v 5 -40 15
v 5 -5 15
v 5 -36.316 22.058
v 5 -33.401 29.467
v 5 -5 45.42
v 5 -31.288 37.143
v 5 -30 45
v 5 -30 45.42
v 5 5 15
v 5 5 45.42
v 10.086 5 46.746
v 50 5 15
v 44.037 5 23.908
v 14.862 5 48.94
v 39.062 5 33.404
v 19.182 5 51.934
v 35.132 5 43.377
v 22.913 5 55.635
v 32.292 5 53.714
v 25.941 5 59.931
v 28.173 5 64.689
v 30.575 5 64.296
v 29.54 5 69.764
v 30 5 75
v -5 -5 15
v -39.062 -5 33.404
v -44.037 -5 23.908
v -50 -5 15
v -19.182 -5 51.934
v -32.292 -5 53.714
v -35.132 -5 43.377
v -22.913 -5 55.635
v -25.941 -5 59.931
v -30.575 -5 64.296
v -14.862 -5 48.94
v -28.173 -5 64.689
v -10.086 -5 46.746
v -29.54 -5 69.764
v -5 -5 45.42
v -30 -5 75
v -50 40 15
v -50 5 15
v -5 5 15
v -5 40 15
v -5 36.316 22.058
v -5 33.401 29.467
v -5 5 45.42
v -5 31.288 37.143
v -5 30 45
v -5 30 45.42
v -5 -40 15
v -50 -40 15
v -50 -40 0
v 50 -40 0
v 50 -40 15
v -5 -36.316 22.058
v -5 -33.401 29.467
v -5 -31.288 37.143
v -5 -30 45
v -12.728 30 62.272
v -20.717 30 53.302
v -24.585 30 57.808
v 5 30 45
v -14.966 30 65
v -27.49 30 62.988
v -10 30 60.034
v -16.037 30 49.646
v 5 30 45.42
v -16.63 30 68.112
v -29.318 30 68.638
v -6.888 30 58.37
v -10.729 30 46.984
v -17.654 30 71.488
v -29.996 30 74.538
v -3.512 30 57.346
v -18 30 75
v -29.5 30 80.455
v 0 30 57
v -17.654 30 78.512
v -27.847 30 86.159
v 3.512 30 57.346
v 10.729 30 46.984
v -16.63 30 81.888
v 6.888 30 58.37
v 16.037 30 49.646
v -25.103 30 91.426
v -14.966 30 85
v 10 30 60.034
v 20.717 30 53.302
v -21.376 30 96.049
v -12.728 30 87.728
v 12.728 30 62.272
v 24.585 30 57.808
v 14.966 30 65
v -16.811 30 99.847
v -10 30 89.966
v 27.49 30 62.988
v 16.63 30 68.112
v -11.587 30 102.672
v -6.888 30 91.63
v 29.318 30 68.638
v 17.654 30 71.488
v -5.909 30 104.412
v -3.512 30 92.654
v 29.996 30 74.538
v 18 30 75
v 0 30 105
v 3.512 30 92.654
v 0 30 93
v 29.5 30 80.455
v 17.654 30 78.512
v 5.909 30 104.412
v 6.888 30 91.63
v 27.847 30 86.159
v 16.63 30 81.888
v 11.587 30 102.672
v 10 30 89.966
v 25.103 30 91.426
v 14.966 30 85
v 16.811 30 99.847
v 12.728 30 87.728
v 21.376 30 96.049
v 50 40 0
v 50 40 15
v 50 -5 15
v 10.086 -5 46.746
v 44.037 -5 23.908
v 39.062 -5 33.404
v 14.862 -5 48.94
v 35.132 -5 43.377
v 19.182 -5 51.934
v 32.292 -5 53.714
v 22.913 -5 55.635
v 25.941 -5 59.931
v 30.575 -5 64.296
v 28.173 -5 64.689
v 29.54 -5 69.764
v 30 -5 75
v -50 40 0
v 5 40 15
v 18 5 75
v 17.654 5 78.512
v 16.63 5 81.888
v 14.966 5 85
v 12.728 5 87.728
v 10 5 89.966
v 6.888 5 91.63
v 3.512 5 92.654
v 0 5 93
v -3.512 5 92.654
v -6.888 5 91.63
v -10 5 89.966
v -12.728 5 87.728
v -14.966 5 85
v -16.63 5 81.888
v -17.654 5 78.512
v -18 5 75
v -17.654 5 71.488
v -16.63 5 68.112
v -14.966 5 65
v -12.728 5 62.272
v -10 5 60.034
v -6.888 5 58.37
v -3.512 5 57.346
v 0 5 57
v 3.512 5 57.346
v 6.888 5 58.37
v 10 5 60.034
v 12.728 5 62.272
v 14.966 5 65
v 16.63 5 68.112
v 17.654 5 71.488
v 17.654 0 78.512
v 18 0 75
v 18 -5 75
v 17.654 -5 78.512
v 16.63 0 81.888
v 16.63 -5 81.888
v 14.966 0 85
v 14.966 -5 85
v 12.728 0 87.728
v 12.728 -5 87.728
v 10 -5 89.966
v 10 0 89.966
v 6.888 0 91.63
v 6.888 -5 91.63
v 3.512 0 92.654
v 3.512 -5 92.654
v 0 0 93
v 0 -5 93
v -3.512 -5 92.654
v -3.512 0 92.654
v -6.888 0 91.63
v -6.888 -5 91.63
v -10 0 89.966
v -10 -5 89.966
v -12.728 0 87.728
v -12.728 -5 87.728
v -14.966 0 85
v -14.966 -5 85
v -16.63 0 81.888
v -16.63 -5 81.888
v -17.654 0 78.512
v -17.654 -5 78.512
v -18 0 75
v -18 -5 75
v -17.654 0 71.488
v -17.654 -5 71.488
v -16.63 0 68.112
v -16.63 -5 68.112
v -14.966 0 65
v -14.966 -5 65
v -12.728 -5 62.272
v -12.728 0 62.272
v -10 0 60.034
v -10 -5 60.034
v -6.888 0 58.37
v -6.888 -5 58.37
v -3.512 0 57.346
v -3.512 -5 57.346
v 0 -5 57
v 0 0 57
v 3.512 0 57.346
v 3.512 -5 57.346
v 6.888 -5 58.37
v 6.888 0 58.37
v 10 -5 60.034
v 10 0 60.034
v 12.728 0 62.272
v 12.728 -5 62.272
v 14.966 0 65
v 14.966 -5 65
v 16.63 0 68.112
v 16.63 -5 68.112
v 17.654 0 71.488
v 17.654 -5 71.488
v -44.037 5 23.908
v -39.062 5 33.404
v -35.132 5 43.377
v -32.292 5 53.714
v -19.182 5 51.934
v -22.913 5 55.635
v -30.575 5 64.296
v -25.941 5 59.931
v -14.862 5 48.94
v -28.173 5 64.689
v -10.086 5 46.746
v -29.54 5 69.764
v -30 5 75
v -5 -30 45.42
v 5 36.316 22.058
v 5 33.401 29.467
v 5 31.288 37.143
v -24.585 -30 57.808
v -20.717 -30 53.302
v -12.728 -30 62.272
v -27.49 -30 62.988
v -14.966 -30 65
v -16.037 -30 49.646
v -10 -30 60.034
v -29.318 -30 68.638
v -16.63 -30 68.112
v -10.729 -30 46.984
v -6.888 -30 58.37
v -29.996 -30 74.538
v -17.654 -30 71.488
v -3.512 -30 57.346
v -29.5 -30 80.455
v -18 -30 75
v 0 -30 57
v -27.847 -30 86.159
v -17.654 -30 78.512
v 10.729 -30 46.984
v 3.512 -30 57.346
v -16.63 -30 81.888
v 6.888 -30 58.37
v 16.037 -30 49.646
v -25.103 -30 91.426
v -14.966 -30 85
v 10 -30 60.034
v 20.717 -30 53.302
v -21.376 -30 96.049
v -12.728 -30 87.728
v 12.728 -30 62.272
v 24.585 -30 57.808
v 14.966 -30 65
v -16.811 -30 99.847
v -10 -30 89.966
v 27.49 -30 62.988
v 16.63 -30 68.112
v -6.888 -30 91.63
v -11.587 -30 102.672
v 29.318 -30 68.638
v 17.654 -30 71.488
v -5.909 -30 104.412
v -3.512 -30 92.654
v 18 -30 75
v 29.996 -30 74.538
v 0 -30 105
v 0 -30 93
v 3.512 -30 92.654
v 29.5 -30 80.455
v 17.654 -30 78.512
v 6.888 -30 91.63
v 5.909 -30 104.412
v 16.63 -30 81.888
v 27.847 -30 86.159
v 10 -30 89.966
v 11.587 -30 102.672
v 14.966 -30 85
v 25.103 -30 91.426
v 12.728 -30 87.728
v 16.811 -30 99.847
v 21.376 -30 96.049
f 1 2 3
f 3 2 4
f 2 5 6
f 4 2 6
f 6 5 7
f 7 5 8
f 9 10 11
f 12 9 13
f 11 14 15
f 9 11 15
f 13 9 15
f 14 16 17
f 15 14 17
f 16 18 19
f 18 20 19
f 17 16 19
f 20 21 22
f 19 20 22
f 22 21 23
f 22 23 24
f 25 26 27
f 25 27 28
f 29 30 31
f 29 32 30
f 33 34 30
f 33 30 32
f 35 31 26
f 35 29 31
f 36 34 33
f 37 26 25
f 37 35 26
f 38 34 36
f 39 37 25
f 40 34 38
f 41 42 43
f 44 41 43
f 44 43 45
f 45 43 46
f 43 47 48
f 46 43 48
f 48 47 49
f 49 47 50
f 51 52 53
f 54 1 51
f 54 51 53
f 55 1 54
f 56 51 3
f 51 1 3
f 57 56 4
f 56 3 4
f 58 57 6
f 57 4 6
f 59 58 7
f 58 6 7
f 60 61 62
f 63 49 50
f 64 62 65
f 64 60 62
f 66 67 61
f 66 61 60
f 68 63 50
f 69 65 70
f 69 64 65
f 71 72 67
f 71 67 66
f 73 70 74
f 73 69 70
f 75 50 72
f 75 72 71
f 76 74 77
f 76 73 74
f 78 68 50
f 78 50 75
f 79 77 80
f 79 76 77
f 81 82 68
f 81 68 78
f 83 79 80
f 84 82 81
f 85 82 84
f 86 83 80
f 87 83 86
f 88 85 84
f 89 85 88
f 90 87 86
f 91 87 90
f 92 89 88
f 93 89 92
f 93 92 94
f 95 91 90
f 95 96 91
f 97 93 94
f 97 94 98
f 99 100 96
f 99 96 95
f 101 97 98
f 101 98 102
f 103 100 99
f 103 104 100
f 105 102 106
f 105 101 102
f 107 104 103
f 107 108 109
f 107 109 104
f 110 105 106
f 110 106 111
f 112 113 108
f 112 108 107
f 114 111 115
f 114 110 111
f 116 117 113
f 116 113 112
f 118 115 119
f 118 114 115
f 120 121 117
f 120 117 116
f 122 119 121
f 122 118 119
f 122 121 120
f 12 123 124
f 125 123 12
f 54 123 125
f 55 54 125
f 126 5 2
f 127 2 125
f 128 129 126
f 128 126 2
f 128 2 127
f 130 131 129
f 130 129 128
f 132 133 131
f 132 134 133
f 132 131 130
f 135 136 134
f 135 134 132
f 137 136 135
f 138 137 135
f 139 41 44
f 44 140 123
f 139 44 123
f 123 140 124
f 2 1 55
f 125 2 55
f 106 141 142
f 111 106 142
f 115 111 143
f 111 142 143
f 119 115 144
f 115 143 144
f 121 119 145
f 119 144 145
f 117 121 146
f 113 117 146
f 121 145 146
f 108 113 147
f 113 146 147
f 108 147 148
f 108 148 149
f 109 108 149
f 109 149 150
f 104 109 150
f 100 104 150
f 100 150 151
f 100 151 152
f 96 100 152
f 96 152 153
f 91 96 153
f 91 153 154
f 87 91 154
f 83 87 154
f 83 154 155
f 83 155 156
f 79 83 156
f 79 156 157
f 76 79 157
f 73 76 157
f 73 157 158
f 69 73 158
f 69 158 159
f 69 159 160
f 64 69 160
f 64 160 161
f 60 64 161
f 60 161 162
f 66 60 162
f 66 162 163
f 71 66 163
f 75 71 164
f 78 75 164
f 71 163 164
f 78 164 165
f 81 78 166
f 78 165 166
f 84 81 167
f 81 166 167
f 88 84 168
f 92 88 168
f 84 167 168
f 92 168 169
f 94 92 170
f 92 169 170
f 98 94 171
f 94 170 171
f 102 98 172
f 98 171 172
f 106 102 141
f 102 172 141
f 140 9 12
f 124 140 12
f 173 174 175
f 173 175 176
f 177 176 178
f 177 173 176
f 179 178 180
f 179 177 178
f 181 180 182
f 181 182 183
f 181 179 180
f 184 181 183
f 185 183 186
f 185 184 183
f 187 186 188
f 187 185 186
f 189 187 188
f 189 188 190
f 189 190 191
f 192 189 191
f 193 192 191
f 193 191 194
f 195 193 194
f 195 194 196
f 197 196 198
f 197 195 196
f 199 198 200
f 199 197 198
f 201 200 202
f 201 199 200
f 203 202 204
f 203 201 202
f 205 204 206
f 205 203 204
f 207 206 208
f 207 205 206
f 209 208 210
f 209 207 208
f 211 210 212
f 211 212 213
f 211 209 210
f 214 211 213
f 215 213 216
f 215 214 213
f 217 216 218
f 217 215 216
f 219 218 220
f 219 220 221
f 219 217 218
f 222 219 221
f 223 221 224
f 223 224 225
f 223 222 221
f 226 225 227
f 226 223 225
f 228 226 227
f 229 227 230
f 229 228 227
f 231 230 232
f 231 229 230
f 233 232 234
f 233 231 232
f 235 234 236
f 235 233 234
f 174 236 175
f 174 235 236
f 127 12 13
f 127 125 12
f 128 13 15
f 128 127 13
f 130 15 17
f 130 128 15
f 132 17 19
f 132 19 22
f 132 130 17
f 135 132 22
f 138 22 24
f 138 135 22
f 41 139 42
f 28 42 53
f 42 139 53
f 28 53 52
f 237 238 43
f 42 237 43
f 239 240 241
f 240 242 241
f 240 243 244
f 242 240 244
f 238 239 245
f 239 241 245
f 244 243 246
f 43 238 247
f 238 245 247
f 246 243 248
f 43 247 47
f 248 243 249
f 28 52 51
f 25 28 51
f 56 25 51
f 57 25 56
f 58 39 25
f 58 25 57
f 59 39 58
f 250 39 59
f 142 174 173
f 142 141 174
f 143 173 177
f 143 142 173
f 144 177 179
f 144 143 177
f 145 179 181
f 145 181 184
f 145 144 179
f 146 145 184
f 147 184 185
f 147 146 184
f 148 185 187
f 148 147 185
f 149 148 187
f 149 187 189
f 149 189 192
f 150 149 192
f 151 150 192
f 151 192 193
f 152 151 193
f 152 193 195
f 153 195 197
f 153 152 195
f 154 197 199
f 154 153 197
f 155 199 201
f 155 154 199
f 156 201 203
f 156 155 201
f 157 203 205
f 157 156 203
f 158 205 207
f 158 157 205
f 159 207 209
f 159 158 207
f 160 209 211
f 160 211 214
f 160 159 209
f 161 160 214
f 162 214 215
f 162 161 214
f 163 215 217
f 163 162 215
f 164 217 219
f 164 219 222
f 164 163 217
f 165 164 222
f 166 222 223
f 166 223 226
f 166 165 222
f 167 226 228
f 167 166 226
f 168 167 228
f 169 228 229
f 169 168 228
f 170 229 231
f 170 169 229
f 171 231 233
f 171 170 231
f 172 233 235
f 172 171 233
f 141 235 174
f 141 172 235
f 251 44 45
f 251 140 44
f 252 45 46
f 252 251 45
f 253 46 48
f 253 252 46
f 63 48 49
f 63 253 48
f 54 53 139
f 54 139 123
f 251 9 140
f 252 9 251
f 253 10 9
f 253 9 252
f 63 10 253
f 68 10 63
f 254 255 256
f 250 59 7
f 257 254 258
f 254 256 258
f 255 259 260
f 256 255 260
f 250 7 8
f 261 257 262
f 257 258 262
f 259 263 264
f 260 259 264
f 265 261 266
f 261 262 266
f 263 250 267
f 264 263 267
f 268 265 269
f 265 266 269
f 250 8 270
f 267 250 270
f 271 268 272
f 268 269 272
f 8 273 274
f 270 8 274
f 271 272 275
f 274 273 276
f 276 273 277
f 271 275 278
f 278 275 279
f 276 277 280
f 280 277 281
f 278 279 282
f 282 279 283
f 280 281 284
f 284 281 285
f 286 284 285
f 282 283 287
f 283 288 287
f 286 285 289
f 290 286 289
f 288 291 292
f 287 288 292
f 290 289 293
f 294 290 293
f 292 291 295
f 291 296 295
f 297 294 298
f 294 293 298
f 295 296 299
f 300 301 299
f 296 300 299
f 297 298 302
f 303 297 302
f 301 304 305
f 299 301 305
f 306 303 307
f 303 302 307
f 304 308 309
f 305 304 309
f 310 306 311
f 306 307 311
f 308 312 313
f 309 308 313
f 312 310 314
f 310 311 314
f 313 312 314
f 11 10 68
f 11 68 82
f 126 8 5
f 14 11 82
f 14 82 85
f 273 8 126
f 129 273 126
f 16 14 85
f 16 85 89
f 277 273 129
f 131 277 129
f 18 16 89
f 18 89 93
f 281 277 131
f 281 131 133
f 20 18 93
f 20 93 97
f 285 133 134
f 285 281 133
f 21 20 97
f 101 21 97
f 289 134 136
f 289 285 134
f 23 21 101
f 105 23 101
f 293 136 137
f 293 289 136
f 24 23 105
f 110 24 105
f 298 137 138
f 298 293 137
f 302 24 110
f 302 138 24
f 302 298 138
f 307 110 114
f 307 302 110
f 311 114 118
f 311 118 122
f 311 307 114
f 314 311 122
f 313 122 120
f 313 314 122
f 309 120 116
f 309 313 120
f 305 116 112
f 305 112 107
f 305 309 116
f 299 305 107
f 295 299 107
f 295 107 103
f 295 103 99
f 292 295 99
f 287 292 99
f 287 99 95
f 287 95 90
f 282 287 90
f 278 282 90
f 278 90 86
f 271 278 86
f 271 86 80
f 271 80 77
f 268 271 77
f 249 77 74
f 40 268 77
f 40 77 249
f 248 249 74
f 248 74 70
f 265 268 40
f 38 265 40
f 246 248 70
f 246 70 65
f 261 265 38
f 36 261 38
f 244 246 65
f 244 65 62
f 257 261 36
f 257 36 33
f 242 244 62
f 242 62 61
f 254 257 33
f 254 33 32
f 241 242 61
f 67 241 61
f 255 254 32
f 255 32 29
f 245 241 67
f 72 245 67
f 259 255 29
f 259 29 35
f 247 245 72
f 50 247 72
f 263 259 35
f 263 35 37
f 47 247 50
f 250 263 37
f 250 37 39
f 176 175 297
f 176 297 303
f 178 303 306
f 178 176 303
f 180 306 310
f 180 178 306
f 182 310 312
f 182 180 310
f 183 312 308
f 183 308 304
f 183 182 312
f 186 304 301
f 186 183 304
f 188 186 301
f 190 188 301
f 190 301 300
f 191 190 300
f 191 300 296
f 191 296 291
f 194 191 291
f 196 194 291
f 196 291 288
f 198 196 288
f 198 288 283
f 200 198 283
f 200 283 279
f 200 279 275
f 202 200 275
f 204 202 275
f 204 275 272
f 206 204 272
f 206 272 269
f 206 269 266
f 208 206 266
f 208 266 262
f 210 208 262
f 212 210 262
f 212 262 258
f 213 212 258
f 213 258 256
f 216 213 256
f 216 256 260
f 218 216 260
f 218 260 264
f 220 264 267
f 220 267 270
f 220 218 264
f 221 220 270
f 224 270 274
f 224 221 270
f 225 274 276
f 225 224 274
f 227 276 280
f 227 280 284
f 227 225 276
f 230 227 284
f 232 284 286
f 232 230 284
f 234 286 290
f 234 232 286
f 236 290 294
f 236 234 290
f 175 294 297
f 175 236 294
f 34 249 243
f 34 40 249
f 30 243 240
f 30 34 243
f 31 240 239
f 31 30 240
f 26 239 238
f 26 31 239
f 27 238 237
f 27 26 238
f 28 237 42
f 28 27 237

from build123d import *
from build123d import SkipClean  # not in build123d's __all__

# Parameters (mm, degrees)
F0_W     = 100
F0_H     = 15
F1_DEPTH = 40
F0_R     = 18
F2_DEPTH = 5
F3_DEPTH = 30
F5_DEPTH = 5


# Not quite as in the source:
# - a pattern or mirror of a feature is missing from the dataset's text; its kind, count and spacing are read off the source's solid


with BuildPart() as f1:
    # F0 (on Front) → F1 (new body, symmetric)
    with BuildSketch(Plane.XZ):
        with Locations((0, 7.5)):
            Rectangle(F0_W, F0_H)
    extrude(amount=F1_DEPTH, both=True)

    # F0 (on Front) → F2 (join, symmetric)
    with BuildSketch(Plane.XZ):
        with BuildLine():
            ThreePointArc((-30, 75), (-35.1316701949, 43.3772233983), (-50, 15))
            Line((-50, 15), (50, 15))
            ThreePointArc((50, 15), (35.1316701949, 43.3772233983), (30, 75))
            ThreePointArc((30, 75), (0, 45), (-30, 75))
        make_face()
        with Locations((0, 7.5)):
            Rectangle(F0_W, F0_H)
        with BuildLine():
            ThreePointArc((30, 75), (0, 105), (-30, 75))
            ThreePointArc((-30, 75), (0, 45), (30, 75))
        make_face()
        with Locations((0, 75)):
            Circle(F0_R, mode=Mode.SUBTRACT)
    extrude(amount=F2_DEPTH, both=True)

    # F0 (on Front) → F3 (join, symmetric)
    with BuildSketch(Plane.XZ):
        with BuildLine():
            ThreePointArc((30, 75), (0, 105), (-30, 75))
            ThreePointArc((-30, 75), (0, 45), (30, 75))
        make_face()
        with Locations((0, 75)):
            Circle(F0_R, mode=Mode.SUBTRACT)
    with SkipClean():  # cleaning this boolean's faces spoils the solid; the shape is the same uncleaned
        extrude(amount=F3_DEPTH, both=True)

    # F4 (on Right) → F5 (join, symmetric)
    with BuildSketch(Plane.YZ):
        with BuildLine():
            ThreePointArc((40, 15), (33.4008913624, 29.4669637875), (30, 45))
            Line((30, 45), (30, 50))
            Line((30, 50), (5, 50))
            Line((5, 50), (5, 15))
            Line((5, 15), (40, 15))
        make_face()
    f5 = extrude(amount=F5_DEPTH, both=True)

    # F5_copies: F5 across plane
    add(f5.mirror(Plane(origin=(0, 0, 0), x_dir=(0, 0, -1), z_dir=(0, -1, 0))), clean=False)


solid = f1.part
